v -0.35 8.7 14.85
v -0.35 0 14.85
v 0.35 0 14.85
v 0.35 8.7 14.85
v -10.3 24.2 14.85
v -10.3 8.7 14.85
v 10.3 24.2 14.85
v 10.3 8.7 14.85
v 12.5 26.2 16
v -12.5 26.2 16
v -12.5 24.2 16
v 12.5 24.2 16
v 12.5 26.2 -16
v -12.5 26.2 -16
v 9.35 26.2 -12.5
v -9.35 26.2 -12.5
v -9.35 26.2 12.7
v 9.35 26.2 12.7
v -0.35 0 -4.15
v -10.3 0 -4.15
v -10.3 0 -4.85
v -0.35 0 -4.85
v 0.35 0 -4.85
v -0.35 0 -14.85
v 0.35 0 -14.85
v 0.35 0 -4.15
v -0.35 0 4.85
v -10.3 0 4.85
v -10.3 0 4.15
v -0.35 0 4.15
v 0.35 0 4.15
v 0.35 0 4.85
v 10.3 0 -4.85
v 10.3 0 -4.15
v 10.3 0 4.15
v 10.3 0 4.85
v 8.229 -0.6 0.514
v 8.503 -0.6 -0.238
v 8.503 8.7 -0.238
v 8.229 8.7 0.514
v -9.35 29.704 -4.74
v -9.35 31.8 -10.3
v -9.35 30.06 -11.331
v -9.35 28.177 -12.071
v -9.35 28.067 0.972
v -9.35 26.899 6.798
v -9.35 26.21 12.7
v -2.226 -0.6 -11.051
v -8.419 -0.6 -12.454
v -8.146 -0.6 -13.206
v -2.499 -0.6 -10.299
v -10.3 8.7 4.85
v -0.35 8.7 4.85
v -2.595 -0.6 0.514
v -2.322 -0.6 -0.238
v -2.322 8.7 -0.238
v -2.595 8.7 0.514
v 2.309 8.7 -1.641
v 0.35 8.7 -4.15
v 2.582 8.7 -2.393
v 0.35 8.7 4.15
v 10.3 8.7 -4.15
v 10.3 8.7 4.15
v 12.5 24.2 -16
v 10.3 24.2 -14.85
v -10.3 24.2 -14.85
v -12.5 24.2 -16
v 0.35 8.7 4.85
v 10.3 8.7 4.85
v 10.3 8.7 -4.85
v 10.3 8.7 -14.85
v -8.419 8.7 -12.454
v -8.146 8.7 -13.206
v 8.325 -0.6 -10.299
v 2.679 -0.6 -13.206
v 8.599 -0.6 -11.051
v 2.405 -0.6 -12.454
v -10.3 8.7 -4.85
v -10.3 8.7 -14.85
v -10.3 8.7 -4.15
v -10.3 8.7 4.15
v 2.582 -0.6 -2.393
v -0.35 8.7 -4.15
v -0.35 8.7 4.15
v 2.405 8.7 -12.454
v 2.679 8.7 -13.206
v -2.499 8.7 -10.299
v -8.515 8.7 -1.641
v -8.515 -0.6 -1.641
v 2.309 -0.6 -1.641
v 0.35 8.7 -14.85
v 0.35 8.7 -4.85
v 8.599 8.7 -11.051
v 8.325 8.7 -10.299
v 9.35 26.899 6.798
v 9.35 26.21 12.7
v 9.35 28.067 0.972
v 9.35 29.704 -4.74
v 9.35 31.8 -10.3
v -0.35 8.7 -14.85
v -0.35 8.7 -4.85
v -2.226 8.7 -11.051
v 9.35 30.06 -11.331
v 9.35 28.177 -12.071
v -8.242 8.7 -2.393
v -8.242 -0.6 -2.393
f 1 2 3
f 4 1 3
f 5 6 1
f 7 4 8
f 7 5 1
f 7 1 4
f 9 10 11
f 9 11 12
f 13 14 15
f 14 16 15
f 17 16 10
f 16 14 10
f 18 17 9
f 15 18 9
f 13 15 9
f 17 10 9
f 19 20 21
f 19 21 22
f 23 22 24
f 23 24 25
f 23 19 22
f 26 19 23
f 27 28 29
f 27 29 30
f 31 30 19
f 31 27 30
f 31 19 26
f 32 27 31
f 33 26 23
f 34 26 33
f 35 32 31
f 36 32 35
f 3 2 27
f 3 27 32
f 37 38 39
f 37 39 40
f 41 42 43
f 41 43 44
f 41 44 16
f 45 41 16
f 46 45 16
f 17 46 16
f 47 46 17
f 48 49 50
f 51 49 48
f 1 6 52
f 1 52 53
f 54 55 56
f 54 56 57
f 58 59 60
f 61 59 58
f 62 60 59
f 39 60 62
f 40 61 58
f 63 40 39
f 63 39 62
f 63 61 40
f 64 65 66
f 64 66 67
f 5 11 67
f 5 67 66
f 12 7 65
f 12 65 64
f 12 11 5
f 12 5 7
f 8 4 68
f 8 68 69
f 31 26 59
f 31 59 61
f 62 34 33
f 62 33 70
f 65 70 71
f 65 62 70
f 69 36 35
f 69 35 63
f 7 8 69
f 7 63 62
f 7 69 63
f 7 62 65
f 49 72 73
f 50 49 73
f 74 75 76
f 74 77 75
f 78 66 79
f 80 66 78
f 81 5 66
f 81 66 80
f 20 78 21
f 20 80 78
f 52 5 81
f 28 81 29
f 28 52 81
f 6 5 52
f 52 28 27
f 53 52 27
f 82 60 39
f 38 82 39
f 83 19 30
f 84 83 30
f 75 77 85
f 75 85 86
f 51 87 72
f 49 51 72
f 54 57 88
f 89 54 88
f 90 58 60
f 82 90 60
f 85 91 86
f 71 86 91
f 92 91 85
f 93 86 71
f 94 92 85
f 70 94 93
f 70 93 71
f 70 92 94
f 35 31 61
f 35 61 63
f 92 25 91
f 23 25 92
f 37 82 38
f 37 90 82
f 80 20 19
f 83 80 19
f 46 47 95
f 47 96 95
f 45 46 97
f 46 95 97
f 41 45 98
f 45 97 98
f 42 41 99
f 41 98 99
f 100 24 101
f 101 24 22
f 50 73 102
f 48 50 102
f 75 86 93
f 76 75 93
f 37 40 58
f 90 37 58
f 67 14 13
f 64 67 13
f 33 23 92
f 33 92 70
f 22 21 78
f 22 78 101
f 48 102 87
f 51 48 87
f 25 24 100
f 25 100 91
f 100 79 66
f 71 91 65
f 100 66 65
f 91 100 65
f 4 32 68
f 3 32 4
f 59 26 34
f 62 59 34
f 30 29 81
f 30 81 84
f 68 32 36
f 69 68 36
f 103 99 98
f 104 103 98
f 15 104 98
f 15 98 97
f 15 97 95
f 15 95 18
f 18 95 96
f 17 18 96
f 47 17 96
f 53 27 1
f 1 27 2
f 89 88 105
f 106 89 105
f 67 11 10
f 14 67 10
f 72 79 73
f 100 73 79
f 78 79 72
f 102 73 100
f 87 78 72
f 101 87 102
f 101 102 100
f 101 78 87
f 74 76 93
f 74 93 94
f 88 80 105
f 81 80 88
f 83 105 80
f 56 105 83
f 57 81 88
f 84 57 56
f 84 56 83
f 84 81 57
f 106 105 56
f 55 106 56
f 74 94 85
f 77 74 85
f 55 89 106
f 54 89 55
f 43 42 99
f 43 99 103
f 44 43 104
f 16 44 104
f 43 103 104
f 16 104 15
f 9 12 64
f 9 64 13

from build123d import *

# Parameters (mm, degrees)
EXTRUDE1_DEPTH     = 14.85
SKETCH2_W          = 25
SKETCH2_H          = 2
EXTRUDE2_DEPTH     = 1.15
EXTRUDE4_DEPTH     = 9.35
SKETCH5_W          = 9.95
SKETCH5_H          = 10
SKETCH5_H_2        = 8.3
CUT_EXTRUDE1_DEPTH = 8.7
EXTRUDE5_DEPTH     = 9.3


with BuildPart() as part:
    # Sketch1 → Extrude1 (new body, symmetric)
    with BuildSketch(Plane.XY):
        Polygon((12.5, 26.2), (-12.5, 26.2), (-12.5, 24.2), (-10.3, 24.2), (-10.3, 0), (10.3, 0), (10.3, 24.2), (12.5, 24.2), align=None)
    extrude(amount=EXTRUDE1_DEPTH, both=True)

    # Sketch2 → Extrude2 (add)
    with BuildSketch(Plane.XY.offset(14.85)):
        with Locations((0, 25.2)):
            Rectangle(SKETCH2_W, SKETCH2_H)
    extrude2 = extrude(amount=EXTRUDE2_DEPTH)

    # Mirror1: Extrude2 across plane
    add(extrude2.mirror(Plane.XY))

    # Sketch4 → Extrude4 (add, symmetric)
    with BuildSketch(Plane(origin=(0, 0, 0), x_dir=(0, 0, -1), z_dir=(1, 0, 0))):
        with BuildLine():
            Line((-12.7, 26.2), (-12.7, 26.21))
            ThreePointArc((-12.7, 26.21), (-0.971928332, 28.066601365), (10.3, 31.8))
            ThreePointArc((10.3, 31.8), (11.738824473, 29.133109614), (12.5, 26.2))
            Line((12.5, 26.2), (-12.7, 26.2))
        make_face()
    extrude(amount=EXTRUDE4_DEPTH, both=True)

    # Sketch5 → Cut-Extrude1 (cut)
    with BuildSketch(Plane.XZ):
        with Locations((5.325, 9.85)):
            Rectangle(SKETCH5_W, SKETCH5_H)
        with Locations((5.325, 0)):
            Rectangle(SKETCH5_W, SKETCH5_H_2)
        with Locations((-5.325, 9.85)):
            Rectangle(SKETCH5_W, SKETCH5_H)
        with Locations((-5.325, -9.85)):
            Rectangle(SKETCH5_W, SKETCH5_H)
        with Locations((5.325, -9.85)):
            Rectangle(SKETCH5_W, SKETCH5_H)
        with Locations((-5.325, 0)):
            Rectangle(SKETCH5_W, SKETCH5_H_2)
    extrude(amount=-CUT_EXTRUDE1_DEPTH, mode=Mode.SUBTRACT)

    # Sketch9 → Extrude5 (add)
    with BuildSketch(Plane.XZ.offset(-8.7)):
        Polygon((-8.145589208, -13.205654355), (-2.225525697, -11.050927452), (-2.499141811, -10.299173355), (-8.419205322, -12.453900258), align=None)
        Polygon((2.678569935, -13.205654355), (8.598633446, -11.050927452), (8.325017331, -10.299173355), (2.40495382, -12.453900258), align=None)
        Polygon((-8.241705742, -2.392544248), (-2.321642231, -0.237817345), (-2.595258346, 0.513936752), (-8.515321856, -1.640790151), align=None)
        Polygon((2.582453401, -2.392544248), (8.502516912, -0.237817345), (8.228900797, 0.513936752), (2.308837286, -1.640790151), align=None)
    extrude(amount=EXTRUDE5_DEPTH)


solid = part.part
